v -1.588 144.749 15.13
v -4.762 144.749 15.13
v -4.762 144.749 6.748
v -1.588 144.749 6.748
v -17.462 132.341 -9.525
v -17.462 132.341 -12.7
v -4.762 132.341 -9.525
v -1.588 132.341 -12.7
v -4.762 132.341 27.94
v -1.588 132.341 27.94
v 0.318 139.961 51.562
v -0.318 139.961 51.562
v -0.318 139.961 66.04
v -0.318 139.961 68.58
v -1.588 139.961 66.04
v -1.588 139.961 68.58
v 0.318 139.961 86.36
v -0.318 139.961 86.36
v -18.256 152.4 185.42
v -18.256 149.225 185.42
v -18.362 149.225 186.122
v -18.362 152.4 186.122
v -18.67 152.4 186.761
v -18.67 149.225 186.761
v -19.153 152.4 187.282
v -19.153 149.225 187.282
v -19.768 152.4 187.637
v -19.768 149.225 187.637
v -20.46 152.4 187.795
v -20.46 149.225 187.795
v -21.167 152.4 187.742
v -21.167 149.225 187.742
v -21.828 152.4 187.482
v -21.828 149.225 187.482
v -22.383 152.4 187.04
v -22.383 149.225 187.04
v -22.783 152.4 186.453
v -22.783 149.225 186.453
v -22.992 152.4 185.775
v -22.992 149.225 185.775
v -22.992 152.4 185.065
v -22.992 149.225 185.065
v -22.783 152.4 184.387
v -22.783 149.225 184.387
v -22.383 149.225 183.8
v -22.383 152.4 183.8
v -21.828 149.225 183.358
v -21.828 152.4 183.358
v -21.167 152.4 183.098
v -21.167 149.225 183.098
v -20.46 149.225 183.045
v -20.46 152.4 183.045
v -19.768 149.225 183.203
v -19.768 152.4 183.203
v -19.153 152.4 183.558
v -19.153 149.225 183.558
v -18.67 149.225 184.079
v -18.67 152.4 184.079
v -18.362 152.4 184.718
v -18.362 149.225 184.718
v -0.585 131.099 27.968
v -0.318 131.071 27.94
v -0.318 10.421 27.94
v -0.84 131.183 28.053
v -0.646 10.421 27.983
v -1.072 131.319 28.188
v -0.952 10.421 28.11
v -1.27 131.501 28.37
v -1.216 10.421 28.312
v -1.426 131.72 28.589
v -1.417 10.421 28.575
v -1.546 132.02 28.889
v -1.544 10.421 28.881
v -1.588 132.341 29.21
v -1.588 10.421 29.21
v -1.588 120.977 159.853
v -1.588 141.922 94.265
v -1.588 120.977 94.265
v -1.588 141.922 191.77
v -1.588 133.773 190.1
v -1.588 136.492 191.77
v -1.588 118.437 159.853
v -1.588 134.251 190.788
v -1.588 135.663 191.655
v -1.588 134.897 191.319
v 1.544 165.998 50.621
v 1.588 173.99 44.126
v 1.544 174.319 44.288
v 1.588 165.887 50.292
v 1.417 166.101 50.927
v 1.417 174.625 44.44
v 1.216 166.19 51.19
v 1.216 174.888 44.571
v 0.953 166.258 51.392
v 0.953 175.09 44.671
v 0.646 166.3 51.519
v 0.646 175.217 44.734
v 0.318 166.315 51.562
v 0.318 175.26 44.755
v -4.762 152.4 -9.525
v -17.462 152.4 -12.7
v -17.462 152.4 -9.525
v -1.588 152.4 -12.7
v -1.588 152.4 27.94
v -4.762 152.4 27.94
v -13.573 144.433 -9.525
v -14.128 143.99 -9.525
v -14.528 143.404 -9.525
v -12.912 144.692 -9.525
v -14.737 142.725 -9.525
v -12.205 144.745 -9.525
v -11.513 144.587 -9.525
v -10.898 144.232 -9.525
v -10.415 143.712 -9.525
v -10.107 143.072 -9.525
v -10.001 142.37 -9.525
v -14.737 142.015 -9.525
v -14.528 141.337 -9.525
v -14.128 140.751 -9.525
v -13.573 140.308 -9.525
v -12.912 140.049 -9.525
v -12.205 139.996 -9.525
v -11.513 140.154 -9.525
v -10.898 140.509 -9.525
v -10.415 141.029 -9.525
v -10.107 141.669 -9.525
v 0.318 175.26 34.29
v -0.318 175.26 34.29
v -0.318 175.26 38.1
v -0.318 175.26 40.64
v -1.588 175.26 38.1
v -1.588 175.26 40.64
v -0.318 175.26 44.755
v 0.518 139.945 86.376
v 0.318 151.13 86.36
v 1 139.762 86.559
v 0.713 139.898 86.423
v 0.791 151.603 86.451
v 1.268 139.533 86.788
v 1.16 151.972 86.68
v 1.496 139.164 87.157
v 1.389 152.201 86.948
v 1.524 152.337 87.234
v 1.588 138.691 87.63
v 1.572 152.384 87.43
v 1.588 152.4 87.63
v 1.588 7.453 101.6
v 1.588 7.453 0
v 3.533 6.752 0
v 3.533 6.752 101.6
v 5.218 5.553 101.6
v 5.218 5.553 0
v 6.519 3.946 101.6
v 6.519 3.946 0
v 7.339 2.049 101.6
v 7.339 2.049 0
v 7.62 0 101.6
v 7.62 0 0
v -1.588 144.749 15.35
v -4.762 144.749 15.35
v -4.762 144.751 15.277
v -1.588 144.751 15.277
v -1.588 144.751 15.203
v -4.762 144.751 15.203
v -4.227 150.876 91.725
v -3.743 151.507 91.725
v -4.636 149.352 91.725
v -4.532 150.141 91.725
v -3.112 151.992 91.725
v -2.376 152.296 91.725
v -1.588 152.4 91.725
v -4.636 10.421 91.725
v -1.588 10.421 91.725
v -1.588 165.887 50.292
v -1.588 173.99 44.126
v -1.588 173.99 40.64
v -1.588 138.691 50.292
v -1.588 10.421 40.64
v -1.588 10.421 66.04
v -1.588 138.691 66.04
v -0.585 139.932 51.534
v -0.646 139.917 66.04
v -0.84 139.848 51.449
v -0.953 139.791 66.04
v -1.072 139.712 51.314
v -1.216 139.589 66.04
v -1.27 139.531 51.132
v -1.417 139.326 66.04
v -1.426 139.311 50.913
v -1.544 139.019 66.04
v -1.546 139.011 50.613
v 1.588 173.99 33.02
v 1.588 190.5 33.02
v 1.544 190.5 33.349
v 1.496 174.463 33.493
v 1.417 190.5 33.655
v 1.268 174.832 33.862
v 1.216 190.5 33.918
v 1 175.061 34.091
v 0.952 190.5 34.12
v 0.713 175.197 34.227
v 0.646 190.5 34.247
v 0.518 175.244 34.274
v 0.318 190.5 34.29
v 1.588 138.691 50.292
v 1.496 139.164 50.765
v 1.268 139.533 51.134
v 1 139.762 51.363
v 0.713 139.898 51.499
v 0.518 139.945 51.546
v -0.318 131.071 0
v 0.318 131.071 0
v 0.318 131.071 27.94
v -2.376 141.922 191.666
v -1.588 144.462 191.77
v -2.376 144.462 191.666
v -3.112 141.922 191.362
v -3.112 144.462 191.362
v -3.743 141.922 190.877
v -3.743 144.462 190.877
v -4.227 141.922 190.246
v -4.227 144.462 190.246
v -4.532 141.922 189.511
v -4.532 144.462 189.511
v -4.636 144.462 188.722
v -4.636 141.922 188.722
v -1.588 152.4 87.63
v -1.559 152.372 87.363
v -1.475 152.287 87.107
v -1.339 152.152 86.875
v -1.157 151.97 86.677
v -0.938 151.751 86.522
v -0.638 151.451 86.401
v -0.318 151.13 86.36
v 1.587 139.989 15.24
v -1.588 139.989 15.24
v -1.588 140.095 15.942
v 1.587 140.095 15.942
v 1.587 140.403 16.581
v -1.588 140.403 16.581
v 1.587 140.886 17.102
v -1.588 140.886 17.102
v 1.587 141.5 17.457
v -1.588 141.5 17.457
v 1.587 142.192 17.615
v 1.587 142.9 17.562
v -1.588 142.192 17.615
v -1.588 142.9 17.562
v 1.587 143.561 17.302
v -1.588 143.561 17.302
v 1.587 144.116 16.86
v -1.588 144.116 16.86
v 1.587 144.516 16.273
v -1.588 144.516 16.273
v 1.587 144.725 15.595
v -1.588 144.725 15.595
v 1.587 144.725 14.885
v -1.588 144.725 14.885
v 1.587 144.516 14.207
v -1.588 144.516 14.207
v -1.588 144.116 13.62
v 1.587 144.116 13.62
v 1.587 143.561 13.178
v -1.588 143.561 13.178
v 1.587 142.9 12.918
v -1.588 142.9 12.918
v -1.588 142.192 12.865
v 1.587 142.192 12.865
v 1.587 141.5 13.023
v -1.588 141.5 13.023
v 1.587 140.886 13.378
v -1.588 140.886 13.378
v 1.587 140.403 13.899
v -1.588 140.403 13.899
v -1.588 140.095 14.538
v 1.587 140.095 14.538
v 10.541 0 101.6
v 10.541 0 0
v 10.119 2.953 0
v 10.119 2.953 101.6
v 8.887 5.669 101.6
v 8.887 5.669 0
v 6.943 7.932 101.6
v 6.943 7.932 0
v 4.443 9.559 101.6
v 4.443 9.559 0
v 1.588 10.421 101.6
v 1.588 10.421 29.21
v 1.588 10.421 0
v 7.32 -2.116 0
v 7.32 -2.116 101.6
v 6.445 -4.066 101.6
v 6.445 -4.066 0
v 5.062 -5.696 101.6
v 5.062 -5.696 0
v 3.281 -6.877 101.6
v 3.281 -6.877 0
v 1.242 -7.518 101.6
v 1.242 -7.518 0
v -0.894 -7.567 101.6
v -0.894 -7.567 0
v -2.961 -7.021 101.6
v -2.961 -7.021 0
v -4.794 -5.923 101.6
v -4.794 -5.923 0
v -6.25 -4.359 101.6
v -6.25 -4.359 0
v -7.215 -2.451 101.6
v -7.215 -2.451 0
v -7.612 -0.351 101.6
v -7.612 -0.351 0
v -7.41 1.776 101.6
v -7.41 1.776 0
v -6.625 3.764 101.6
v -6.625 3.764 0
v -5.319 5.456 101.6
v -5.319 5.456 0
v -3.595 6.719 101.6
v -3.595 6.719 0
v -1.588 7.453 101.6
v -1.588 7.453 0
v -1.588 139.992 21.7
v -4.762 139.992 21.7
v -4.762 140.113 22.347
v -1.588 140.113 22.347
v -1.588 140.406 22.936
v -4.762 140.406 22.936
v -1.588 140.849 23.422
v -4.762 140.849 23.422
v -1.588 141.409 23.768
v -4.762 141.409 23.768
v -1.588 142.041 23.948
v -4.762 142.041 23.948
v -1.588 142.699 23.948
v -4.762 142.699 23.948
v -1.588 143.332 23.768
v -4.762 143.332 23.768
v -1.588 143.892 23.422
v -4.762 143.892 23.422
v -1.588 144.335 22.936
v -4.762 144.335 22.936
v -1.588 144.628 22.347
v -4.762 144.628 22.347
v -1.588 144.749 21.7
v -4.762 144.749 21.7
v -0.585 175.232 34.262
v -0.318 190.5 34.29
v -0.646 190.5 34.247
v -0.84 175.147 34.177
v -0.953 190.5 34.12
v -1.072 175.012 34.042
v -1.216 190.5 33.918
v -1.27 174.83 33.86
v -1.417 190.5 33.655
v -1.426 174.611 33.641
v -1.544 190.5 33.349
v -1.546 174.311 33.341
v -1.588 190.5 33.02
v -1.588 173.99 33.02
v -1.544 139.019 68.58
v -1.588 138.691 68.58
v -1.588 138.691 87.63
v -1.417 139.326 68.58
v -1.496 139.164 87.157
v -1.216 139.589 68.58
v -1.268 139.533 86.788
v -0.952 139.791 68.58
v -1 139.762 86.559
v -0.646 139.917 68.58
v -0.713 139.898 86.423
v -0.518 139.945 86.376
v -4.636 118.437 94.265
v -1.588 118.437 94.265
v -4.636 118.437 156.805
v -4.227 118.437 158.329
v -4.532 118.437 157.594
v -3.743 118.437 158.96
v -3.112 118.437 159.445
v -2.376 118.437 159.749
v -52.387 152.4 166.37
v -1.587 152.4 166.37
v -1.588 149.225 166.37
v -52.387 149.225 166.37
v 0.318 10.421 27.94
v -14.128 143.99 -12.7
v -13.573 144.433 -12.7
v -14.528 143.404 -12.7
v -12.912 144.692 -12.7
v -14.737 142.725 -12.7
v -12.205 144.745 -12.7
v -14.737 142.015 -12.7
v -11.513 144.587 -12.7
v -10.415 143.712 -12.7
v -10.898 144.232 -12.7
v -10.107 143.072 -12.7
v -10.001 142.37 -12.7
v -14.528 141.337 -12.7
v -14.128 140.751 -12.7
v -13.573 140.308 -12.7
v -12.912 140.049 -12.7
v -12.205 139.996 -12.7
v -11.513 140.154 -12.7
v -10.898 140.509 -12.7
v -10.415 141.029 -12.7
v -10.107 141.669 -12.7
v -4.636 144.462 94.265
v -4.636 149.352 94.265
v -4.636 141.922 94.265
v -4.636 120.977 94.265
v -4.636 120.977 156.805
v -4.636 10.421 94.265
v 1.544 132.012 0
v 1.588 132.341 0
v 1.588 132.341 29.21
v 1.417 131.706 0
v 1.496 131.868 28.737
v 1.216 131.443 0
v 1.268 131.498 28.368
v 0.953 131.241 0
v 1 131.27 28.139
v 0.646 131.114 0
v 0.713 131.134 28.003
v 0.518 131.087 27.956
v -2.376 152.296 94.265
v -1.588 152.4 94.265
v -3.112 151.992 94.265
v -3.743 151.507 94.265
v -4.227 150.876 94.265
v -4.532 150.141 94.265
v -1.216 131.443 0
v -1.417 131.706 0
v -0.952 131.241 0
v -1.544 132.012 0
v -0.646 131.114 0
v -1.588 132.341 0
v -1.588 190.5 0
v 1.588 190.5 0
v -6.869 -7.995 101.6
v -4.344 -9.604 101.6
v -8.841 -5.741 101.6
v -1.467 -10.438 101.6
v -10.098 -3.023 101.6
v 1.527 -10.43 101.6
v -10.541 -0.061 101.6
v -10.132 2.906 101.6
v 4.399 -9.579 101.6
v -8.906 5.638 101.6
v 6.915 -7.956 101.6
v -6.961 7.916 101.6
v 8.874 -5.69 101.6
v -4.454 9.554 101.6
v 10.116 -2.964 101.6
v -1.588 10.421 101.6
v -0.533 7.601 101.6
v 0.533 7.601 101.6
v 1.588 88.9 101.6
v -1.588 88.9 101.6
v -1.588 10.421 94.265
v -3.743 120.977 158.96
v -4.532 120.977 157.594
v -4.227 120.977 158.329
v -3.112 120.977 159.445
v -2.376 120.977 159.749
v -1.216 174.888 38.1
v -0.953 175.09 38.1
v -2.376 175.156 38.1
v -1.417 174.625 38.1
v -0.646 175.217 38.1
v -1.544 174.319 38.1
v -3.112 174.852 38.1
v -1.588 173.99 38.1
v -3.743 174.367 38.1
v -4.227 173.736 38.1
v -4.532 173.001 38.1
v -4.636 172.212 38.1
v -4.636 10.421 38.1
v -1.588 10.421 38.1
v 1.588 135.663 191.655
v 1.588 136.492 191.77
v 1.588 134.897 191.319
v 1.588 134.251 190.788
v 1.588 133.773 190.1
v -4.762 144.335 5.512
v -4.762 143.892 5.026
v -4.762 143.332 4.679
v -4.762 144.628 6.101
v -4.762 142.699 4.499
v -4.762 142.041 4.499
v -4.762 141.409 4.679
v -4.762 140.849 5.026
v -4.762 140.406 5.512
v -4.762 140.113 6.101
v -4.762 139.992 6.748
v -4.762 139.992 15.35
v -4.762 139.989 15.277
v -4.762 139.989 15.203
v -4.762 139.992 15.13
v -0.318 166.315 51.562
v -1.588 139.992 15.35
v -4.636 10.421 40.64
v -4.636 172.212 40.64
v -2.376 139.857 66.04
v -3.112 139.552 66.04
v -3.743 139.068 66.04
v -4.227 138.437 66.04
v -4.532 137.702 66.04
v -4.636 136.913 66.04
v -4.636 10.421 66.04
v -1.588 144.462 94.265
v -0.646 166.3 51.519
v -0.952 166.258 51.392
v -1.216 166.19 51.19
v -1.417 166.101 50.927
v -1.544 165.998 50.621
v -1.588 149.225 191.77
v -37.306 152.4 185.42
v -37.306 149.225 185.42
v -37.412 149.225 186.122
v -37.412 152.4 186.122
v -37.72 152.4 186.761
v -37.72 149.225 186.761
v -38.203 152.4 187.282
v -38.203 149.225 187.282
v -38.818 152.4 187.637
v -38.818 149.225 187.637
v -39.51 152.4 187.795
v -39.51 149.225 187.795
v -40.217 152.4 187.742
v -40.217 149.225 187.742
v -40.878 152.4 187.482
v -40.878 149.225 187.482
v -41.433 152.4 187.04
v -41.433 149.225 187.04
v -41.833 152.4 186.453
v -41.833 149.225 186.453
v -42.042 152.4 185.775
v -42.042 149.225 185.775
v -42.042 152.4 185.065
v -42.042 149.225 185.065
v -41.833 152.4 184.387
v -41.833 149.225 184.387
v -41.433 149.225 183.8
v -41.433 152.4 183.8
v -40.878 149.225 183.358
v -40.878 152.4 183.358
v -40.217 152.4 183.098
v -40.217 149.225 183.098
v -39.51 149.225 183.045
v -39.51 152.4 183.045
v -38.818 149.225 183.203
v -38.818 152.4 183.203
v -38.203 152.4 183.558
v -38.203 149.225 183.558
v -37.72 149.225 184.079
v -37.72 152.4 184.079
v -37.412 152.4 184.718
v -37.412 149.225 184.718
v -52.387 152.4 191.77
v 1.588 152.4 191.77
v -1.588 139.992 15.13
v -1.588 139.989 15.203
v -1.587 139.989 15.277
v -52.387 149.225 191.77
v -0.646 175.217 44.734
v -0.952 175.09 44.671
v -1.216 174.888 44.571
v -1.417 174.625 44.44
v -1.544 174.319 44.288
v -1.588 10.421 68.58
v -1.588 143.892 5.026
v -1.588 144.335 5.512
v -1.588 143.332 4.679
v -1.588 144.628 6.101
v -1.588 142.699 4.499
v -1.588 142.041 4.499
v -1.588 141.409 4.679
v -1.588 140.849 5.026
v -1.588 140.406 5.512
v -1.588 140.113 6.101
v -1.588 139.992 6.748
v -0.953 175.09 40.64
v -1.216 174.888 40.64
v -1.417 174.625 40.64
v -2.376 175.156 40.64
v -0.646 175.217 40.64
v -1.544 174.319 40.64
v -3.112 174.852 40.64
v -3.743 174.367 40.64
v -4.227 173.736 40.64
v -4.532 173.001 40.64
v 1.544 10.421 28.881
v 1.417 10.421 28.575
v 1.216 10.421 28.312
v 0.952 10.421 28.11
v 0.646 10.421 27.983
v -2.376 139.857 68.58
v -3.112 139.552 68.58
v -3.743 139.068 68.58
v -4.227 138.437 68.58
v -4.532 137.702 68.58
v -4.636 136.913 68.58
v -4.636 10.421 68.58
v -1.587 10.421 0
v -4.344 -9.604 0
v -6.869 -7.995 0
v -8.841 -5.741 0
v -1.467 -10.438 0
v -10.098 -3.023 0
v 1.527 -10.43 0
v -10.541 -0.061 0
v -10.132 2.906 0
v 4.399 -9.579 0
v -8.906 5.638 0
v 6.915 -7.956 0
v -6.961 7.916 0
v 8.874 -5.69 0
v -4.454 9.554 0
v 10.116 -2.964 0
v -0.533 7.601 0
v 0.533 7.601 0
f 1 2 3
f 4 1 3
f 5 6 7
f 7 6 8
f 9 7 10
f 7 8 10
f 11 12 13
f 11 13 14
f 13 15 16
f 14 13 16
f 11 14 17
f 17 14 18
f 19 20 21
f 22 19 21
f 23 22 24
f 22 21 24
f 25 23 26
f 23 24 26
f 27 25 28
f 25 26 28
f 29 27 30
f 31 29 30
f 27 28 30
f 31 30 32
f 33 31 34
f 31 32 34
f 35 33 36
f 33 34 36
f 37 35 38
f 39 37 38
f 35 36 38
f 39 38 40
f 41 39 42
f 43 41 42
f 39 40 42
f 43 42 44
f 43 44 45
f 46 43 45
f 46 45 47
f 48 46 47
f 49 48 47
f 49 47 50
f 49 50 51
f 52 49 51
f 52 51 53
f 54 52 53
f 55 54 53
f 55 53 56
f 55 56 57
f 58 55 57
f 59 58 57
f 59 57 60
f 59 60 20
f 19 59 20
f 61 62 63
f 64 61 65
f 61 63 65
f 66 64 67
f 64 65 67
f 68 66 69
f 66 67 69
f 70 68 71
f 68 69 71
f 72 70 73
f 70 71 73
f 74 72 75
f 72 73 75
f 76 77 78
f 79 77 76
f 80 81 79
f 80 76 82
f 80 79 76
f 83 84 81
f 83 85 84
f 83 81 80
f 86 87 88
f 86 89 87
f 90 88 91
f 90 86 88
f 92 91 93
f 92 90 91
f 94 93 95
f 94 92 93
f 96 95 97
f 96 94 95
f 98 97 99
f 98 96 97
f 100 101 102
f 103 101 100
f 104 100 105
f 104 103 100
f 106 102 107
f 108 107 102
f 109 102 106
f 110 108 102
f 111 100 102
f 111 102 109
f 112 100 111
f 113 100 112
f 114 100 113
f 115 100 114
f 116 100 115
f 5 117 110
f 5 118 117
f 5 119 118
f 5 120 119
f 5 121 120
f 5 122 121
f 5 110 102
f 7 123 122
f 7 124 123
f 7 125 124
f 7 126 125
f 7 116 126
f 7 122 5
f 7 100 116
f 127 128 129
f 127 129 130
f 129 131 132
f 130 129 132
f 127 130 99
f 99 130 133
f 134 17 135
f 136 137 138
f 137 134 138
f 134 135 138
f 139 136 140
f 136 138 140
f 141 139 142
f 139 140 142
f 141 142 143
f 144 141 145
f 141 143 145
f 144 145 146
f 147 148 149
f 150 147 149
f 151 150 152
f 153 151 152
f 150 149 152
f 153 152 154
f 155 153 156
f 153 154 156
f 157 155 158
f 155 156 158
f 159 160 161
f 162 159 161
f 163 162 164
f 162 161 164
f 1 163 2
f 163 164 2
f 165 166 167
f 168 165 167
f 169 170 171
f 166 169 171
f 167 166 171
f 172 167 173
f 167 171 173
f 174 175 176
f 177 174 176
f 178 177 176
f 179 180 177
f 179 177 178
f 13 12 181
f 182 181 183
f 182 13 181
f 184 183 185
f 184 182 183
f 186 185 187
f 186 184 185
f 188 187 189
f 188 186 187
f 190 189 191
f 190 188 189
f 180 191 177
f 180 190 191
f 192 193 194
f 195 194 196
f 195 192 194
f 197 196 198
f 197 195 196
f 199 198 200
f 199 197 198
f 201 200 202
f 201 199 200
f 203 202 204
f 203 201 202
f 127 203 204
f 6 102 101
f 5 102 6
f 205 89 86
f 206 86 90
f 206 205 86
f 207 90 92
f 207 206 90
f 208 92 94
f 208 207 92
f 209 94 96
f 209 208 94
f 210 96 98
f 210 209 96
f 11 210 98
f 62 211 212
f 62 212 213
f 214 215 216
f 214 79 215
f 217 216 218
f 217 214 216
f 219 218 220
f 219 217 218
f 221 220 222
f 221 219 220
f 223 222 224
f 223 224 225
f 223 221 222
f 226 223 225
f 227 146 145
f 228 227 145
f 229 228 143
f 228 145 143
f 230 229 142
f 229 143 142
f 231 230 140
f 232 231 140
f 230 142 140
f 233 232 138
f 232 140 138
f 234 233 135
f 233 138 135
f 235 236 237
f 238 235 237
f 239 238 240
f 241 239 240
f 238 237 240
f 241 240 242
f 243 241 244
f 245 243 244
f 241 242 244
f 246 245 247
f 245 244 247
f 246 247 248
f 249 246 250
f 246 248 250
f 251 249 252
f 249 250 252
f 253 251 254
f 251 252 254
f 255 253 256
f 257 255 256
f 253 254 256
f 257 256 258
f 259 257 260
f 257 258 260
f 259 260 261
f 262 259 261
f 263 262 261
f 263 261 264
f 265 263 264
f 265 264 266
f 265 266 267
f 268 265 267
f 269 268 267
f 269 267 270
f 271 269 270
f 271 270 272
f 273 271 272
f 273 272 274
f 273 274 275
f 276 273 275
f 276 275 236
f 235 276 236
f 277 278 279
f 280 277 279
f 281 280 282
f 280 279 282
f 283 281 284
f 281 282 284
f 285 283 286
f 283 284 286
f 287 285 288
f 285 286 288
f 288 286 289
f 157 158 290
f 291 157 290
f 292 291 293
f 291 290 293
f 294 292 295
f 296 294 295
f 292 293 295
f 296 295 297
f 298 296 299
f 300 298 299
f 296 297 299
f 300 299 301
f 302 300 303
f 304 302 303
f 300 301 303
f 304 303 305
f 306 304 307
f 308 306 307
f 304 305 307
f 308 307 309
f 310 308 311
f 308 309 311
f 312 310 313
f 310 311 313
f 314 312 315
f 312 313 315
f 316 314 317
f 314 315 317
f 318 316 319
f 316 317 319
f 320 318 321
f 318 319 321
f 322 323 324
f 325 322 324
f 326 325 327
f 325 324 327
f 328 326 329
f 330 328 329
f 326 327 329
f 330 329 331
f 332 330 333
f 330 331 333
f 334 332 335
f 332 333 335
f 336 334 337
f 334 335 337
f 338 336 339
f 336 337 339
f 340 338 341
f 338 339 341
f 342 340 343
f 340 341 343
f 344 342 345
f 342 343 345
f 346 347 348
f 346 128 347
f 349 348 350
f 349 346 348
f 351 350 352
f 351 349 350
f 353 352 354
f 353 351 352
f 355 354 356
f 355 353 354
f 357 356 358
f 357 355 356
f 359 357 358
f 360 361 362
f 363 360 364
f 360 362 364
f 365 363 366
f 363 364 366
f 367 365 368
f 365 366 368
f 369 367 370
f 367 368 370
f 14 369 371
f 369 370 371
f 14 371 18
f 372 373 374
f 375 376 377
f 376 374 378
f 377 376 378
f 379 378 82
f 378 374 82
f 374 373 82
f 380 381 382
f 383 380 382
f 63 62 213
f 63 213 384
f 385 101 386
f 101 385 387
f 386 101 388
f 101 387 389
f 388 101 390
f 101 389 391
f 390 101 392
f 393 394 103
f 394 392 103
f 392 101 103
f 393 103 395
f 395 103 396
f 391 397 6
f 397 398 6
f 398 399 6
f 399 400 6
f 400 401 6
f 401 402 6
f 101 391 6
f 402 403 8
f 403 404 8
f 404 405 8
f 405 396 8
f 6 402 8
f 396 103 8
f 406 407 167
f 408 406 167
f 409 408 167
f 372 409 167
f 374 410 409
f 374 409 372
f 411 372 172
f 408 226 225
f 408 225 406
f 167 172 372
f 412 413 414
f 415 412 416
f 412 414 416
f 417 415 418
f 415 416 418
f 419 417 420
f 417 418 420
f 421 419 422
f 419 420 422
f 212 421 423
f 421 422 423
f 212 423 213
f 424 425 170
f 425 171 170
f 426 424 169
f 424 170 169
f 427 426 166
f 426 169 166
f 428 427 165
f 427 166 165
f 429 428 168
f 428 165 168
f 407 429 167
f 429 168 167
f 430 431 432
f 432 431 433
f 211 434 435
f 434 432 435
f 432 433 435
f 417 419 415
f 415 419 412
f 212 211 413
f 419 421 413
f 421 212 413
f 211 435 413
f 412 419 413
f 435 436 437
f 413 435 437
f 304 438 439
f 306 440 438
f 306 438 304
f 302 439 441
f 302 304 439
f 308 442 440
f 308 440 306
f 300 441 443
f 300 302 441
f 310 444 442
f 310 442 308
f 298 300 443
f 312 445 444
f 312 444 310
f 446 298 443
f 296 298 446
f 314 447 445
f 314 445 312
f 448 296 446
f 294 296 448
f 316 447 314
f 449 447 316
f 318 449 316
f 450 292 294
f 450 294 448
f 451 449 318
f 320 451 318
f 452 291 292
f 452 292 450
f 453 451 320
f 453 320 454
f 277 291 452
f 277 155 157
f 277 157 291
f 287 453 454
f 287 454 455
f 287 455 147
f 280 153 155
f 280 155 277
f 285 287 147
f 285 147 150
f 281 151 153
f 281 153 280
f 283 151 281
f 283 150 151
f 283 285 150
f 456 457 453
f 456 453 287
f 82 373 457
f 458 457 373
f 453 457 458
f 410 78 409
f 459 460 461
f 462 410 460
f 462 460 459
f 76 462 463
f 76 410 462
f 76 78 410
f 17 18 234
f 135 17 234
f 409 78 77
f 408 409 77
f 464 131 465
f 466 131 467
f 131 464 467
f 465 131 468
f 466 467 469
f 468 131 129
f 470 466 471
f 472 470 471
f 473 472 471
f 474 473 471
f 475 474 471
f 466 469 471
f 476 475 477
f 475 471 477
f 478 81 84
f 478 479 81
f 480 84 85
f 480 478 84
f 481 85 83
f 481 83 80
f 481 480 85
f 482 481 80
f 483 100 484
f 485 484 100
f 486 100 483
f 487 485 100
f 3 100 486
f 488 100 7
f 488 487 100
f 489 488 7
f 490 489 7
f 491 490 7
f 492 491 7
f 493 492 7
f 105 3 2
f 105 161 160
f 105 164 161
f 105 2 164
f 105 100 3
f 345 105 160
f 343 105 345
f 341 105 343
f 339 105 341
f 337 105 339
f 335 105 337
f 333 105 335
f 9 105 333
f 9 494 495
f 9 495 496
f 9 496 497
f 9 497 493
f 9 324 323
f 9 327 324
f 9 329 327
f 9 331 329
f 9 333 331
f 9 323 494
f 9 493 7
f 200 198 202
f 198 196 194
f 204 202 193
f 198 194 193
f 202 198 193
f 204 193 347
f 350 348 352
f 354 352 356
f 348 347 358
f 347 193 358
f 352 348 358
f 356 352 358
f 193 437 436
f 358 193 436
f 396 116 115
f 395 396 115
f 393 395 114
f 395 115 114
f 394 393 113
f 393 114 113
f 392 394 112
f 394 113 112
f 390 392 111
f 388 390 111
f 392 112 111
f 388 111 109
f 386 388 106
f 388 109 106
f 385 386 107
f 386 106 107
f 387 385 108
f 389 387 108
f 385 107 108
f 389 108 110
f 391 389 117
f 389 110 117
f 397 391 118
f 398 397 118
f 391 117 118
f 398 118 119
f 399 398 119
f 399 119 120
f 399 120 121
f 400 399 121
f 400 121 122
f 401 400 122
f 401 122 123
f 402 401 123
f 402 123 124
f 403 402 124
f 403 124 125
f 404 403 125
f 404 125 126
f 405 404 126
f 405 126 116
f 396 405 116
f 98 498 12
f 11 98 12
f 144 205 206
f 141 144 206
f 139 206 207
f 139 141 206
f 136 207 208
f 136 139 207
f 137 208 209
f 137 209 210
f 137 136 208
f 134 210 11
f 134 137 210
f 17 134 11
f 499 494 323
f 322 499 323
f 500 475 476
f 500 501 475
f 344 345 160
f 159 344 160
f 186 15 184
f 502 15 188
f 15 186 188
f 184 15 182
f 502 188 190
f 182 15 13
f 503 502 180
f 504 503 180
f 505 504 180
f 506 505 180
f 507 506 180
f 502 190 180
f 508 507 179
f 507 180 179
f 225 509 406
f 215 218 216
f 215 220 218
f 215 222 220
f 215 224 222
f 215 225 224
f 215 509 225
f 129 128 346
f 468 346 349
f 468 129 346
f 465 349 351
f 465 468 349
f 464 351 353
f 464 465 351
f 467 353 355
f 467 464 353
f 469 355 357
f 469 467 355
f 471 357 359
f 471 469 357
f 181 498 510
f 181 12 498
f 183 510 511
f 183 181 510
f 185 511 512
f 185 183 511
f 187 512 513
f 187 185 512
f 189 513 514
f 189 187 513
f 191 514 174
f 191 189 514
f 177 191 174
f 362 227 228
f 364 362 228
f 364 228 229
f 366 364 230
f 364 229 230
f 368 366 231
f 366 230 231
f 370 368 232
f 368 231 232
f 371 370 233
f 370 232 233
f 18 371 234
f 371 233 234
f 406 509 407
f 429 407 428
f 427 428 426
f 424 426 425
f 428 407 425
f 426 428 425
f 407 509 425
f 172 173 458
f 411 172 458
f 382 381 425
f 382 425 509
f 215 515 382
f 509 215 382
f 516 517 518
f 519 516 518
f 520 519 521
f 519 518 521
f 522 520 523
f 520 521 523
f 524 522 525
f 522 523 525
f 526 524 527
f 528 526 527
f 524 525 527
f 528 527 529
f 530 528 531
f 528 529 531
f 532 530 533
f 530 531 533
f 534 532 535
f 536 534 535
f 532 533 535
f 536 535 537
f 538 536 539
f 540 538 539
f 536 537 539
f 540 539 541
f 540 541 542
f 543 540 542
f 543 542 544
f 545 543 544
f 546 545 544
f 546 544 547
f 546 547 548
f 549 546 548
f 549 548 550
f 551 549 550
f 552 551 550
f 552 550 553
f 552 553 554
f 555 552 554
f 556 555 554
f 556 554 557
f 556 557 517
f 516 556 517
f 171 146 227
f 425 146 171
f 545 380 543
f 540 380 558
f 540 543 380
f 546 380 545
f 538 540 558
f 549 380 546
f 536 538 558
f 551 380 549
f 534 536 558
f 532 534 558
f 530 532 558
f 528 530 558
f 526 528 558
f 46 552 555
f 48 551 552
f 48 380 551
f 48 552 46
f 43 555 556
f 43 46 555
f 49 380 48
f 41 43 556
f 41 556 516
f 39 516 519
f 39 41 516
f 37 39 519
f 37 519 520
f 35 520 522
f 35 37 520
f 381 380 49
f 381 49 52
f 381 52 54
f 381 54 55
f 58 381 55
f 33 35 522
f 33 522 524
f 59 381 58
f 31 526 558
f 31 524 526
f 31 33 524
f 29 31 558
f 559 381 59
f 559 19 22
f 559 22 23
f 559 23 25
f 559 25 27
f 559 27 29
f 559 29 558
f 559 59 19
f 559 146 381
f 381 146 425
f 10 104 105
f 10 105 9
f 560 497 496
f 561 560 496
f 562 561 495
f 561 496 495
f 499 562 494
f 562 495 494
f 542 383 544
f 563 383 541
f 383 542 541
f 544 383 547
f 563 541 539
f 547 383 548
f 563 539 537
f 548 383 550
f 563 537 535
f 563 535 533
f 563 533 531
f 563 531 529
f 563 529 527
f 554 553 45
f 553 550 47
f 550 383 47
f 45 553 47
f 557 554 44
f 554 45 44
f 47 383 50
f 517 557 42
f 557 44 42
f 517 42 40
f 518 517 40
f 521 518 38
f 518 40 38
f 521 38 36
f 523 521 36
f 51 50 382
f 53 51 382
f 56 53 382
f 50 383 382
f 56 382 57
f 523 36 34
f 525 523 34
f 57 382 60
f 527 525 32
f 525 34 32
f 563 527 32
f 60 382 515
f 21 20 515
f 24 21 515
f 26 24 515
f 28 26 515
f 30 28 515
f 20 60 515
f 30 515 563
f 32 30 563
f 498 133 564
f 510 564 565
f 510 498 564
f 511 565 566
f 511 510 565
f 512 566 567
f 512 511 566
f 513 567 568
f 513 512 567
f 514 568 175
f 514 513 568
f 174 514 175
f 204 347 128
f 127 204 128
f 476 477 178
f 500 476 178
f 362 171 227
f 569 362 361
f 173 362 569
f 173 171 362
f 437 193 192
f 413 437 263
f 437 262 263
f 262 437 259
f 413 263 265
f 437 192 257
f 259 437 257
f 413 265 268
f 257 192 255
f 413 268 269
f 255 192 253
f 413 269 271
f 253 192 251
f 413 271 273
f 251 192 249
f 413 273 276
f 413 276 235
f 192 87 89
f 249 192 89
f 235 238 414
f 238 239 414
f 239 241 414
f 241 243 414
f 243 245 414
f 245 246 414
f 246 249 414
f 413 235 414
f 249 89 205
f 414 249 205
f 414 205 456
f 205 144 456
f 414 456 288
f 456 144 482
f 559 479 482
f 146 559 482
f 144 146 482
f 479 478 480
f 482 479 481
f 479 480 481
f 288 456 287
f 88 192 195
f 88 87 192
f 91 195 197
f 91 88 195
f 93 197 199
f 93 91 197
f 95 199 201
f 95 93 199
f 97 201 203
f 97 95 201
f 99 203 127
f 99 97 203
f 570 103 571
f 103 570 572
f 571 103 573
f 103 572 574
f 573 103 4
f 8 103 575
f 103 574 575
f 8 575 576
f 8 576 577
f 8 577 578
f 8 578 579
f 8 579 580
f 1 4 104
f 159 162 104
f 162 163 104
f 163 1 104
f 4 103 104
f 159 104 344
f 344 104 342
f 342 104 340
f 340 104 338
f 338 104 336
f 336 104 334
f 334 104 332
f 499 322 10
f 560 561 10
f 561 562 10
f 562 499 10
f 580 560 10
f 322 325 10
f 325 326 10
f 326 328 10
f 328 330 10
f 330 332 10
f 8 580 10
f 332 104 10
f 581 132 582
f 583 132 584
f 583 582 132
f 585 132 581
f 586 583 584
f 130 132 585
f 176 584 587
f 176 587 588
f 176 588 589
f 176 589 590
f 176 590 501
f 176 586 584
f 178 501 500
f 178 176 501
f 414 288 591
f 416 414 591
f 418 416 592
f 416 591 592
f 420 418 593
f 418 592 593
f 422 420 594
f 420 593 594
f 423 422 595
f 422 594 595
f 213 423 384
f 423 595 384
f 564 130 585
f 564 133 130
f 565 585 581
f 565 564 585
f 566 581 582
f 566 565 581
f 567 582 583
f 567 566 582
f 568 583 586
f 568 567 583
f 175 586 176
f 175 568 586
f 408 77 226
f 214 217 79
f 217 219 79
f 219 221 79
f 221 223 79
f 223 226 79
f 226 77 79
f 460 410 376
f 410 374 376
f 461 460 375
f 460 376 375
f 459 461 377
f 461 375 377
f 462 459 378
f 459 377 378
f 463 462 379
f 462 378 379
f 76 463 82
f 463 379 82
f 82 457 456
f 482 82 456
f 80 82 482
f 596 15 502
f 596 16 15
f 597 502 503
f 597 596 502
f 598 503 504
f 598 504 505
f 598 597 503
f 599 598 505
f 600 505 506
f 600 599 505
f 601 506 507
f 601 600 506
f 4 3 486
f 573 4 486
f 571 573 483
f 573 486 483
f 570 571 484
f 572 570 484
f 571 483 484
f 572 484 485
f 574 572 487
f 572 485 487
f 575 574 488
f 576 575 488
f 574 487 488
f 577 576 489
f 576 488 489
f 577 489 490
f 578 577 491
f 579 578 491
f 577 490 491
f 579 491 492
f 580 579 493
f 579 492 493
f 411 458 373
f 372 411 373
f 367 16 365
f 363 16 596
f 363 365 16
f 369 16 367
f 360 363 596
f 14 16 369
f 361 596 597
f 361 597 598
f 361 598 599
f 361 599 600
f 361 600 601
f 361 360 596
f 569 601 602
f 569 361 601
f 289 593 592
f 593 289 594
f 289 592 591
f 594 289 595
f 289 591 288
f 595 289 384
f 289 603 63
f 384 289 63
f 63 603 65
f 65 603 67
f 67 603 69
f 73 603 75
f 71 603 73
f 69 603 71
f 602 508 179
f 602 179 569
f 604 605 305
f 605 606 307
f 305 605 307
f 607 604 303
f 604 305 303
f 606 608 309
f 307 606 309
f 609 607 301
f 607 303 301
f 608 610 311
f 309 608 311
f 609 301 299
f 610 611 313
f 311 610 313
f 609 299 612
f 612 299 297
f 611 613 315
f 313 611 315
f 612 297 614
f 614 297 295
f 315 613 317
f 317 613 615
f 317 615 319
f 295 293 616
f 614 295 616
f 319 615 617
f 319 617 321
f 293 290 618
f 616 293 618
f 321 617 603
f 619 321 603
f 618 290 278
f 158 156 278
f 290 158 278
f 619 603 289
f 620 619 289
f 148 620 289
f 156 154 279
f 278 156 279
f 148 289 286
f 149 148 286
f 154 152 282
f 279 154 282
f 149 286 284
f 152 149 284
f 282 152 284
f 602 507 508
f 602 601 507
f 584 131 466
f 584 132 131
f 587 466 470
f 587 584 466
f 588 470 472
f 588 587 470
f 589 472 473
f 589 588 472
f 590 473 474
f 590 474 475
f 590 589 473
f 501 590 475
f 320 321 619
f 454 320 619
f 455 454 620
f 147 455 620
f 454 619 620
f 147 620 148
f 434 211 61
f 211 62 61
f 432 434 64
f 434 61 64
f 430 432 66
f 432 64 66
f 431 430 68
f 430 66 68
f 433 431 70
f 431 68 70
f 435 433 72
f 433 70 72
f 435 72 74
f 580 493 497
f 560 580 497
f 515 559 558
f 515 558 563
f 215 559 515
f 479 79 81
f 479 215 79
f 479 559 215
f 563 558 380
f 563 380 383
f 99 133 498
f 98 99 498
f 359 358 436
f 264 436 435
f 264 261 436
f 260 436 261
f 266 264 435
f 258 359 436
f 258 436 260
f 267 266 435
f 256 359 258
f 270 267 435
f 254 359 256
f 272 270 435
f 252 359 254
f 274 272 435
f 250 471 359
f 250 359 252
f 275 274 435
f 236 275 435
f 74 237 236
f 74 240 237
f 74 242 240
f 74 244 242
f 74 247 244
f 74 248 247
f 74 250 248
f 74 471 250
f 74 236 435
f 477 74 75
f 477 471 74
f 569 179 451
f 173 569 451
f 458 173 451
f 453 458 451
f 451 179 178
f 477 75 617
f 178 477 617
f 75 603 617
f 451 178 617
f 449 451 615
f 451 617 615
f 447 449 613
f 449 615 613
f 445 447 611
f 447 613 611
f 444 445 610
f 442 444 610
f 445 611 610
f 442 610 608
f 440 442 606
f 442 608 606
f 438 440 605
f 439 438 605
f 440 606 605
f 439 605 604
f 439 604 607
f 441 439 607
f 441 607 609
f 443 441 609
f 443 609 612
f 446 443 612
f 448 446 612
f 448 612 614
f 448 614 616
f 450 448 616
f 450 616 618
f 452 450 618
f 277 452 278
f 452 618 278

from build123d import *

# Parameters (mm, degrees)
F1_DEPTH  = 101.6
F2_W      = 120.65
F2_H      = 27.94
F3_DEPTH  = 3.175
F4_W      = 38.1
F4_H      = 15.24
F5_DEPTH  = 3.175
F7_DEPTH  = 3.175
F8_W      = 3.175
F8_H      = 25.4
F9_DEPTH  = 50.8
F10_R     = 2.38125
F11_DEPTH = 7.62
F12_W     = 2.54
F12_H     = 65.5879406387
F12_H_2   = 97.5048740911
F12_W_2   = 129.54
F12_H_3   = 2.54
F12_W_3   = 164.8392262883
F13_DEPTH = 3.048
F14_R     = 3.04799
F15_R     = 1.27
F16_W     = 20.0592262883
F16_H     = 27.94
F16_H_2   = 12.7
F17_DEPTH = 3.175
F18_R     = 2.38125
F19_DEPTH = 25.4
F21_DEPTH = 3.175
F22_W     = 20.0592262883
F22_H     = 3.175
F23_DEPTH = 12.7
F24_R     = 2.38125
F25_DEPTH = 25.4


# Not quite as in the source:
# - a fillet or chamfer is up to 0.001 mm smaller than in the source, because OpenCascade refuses the exact size


with BuildPart() as f1:
    # F0 (on Top) → F1 (new body)
    with BuildSketch(Plane.XY):
        with BuildLine():
            ThreePointArc((1.5875, 7.4528010674), (5.9228856987, 4.7941448664), (7.62, 0))
            ThreePointArc((7.62, 0), (-4.7941448664, -5.9228856987), (-1.5875, 7.4528010674))
            Line((-1.5875, 7.4528010674), (-1.5875, 10.4207737117))
            ThreePointArc((-1.5875, 10.4207737117), (-6.8694557099, -7.9952022645), (10.541, 0))
            ThreePointArc((10.541, 0), (7.9952022645, 6.8694557099), (1.5875, 10.4207737117))
            Line((1.5875, 10.4207737117), (1.5875, 7.4528010674))
        make_face()
        with BuildLine():
            ThreePointArc((-1.5875, 7.4528010674), (0, 7.62), (1.5875, 7.4528010674))
            Line((1.5875, 7.4528010674), (1.5875, 10.4207737117))
            ThreePointArc((1.5875, 10.4207737117), (0, 10.541), (-1.5875, 10.4207737117))
            Line((-1.5875, 10.4207737117), (-1.5875, 7.4528010674))
        make_face()
        with BuildLine():
            ThreePointArc((-1.5875, 10.4207737117), (0, 10.541), (1.5875, 10.4207737117))
            Line((1.5875, 10.4207737117), (1.5875, 190.5))
            Line((1.5875, 190.5), (-1.5875, 190.5))
            Line((-1.5875, 190.5), (-1.5875, 10.4207737117))
        make_face()
    extrude(amount=F1_DEPTH)

    # F2 (on face) → F3 (cut, through all)
    with BuildSketch(Plane(origin=(-1.5875, 0, 0), x_dir=(0, -1, 0), z_dir=(-1, 0, 0))):
        with Locations((-70.7457737117, 13.97)):
            Rectangle(F2_W, F2_H)
    extrude(amount=-F3_DEPTH, mode=Mode.SUBTRACT)

    # F4 (on face) → F5 (cut, through all)
    with BuildSketch(Plane(origin=(-1.5875, 0, 0), x_dir=(0, -1, 0), z_dir=(-1, 0, 0))):
        Polygon((-152.4, 86.36), (-190.5, 86.36), (-190.5, 51.562), (-175.26, 51.562), (-166.3150191307, 51.562), (-139.9607737117, 51.562), (-139.9607737117, 86.36), align=None)
        with Locations((-171.45, 93.98)):
            Rectangle(F4_W, F4_H)
        Polygon((-175.26, 51.562), (-190.5, 51.562), (-190.5, 34.29), (-175.26, 34.29), (-175.26, 44.7550229728), align=None)
        Polygon((-166.3150191307, 51.562), (-175.26, 51.562), (-175.26, 44.7550229728), align=None)
    extrude(amount=-F5_DEPTH, mode=Mode.SUBTRACT)

    # F6 (on face) → F7 (join, through all)
    with BuildSketch(Plane(origin=(-1.5875, 0, 0), x_dir=(0, -1, 0), z_dir=(-1, 0, 0))):
        Polygon((-152.4, 191.77), (-152.4, 101.6), (-88.9, 101.6), (-134.62, 191.77), align=None)
    extrude(amount=-F7_DEPTH)

    # F8 (on face) → F9 (join)
    with BuildSketch(Plane(origin=(-1.5875, 0, 0), x_dir=(0, -1, 0), z_dir=(-1, 0, 0))):
        with Locations((-150.8125, 179.07)):
            Rectangle(F8_W, F8_H)
    extrude(amount=F9_DEPTH)

    # F10 (on face) + F9_face1 (on face) → F11 (cut)
    with BuildSketch(Plane.XZ.offset(-149.225)):
        with Locations((-39.6875, 185.42)):
            Circle(F10_R)
        with Locations((-20.6375, 185.42)):
            Circle(F10_R)
    with BuildSketch(Plane(origin=(-21.429280397, 152.4, 170.8307568238), x_dir=(-1, 0, 0), z_dir=(0, 1, 0))):
        Polygon((-23.016780397, -84.4707568238), (-19.841780397, -84.4707568238), (-19.841780397, -4.4607568238), (30.958219603, -4.4607568238), (30.958219603, 20.9392431762), (-23.016780397, 20.9392431762), align=None)
    extrude(amount=-F11_DEPTH, dir=(0, -1, 0), mode=Mode.SUBTRACT)

    # F12 (on face) → F13 (join)
    with BuildSketch(Plane(origin=(-1.5875, 0, 0), x_dir=(0, -1, 0), z_dir=(-1, 0, 0))):
        with Locations((-119.7067661368, 127.0590962282)):
            Rectangle(F12_W, F12_H)
        with Locations((-143.1925, 143.0175629544)):
            Rectangle(F12_W, F12_H_2)
        Polygon((-152.4, 91.7251259089), (-10.4207737117, 91.7251259089), (-10.4207737117, 94.2651259089), (-118.4367661368, 94.2651259089), (-120.9767661368, 94.2651259089), (-141.9225, 94.2651259089), (-144.4625, 94.2651259089), (-152.4, 94.2651259089), align=None)
        with Locations((-75.1907737117, 67.31)):
            Rectangle(F12_W_2, F12_H_3)
        with Locations((-92.8403868558, 39.37)):
            Rectangle(F12_W_3, F12_H_3)
    extrude(amount=F13_DEPTH)

    # F14 (radius 3.048 in the source; OpenCascade refuses exactly that, so slightly less here)
    f14_edges = [f1.edges().sort_by_distance(p)[0] for p in [
        (0, 134.62, 191.77),
        (-4.6355, 143.1925, 191.77),
        (-4.6355, 152.4, 92.995126),
        (-4.6355, 139.960774, 67.31),
        (-4.6355, 119.706766, 159.853067),
        (-4.6355, 175.26, 39.37),
    ]]
    fillet(f14_edges, radius=F14_R)

    # F15
    f15_edges = [f1.edges().sort_by_distance(p)[0] for p in [
        (-1.5875, 170.78751, 48.158511),
        (-1.5875, 153.137896, 51.562),
        (-1.5875, 182.88, 34.29),
        (-1.5875, 175.26, 36.195),
        (-1.5875, 175.26, 42.697511),
        (1.5875, 182.88, 34.29),
        (1.5875, 175.26, 39.522511),
        (1.5875, 170.78751, 48.158511),
        (1.5875, 153.137896, 51.562),
        (-1.5875, 139.960774, 58.801),
        (-1.5875, 139.960774, 77.47),
        (1.5875, 139.960774, 68.961),
        (-1.5875, 146.180387, 86.36),
        (1.5875, 146.180387, 86.36),
        (0, 152.4, 86.36),
        (1.5875, 70.745774, 27.94),
        (-1.5875, 70.745774, 27.94),
        (1.5875, 131.070774, 13.97),
        (-1.5875, 131.070774, 13.97),
    ]]
    fillet(f15_edges, radius=F15_R)


with BuildPart() as f17:
    # F16 (on face) → F17 (new body)
    with BuildSketch(Plane(origin=(-1.5875, 0, 0), x_dir=(0, -1, 0), z_dir=(-1, 0, 0))):
        with Locations((-142.3703868558, 13.97)):
            Rectangle(F16_W, F16_H)
        with Locations((-142.3703868558, -6.35)):
            Rectangle(F16_W, F16_H_2)
    extrude(amount=F17_DEPTH)


with BuildPart() as f19_tool:
    # F18 (on face) → F19 (new body)
    with BuildSketch(Plane(origin=(-4.7625, 0, 0), x_dir=(0, -1, 0), z_dir=(-1, 0, 0))):
        with Locations((-142.3703868558, 15.24)):
            Circle(F18_R)
    extrude(amount=-F19_DEPTH)


with BuildPart() as f1_1:
    add(f1.part)

    # F19: cut by f19_tool
    add(f19_tool.part, mode=Mode.SUBTRACT)


with BuildPart() as f17_1:
    add(f17.part)

    # F19: cut by f19_tool
    add(f19_tool.part, mode=Mode.SUBTRACT)

    # F20 (on face) → F21 (cut, through all)
    with BuildSketch(Plane(origin=(-4.7625, 0, 0), x_dir=(0, -1, 0), z_dir=(-1, 0, 0))):
        with BuildLine():
            Line((-144.7490949204, 21.6999977557), (-139.9916787913, 21.6999977557))
            ThreePointArc((-139.9916787913, 21.6999977557), (-142.3703868558, 23.97125), (-144.7490949204, 21.6999977557))
        make_face()
        with BuildLine():
            Line((-139.9916787913, 21.4800022443), (-139.9916787913, 21.6999977557))
            Line((-139.9916787913, 21.6999977557), (-144.7490949204, 21.6999977557))
            Line((-144.7490949204, 21.6999977557), (-144.7490949204, 21.4800022443))
            ThreePointArc((-144.7490949204, 21.4800022443), (-142.3703868558, 19.20875), (-139.9916787913, 21.4800022443))
        make_face()
        with BuildLine():
            Line((-139.9916787913, 15.3499977557), (-139.9916787913, 21.4800022443))
            ThreePointArc((-139.9916787913, 21.4800022443), (-142.3703868558, 19.20875), (-144.7490949204, 21.4800022443))
            Line((-144.7490949204, 21.4800022443), (-144.7490949204, 15.3499977557))
            ThreePointArc((-144.7490949204, 15.3499977557), (-142.3703868558, 17.62125), (-139.9916787913, 15.3499977557))
        make_face()
        with BuildLine():
            Line((-139.9916787913, 6.9676285562), (-139.9916787913, 15.1300022443))
            ThreePointArc((-139.9916787913, 15.1300022443), (-142.3703868558, 12.85875), (-144.7490949204, 15.1300022443))
            Line((-144.7490949204, 15.1300022443), (-144.7490949204, 6.9676285562))
            ThreePointArc((-144.7490949204, 6.9676285562), (-142.3703868558, 9.2388808006), (-139.9916787913, 6.9676285562))
        make_face()
        with BuildLine():
            Line((-139.9916787913, 6.7476330449), (-139.9916787913, 6.9676285562))
            ThreePointArc((-139.9916787913, 6.9676285562), (-142.3703868558, 9.2388808006), (-144.7490949204, 6.9676285562))
            Line((-144.7490949204, 6.9676285562), (-144.7490949204, 6.7476330449))
            ThreePointArc((-144.7490949204, 6.7476330449), (-142.3703868558, 4.4763808006), (-139.9916787913, 6.7476330449))
        make_face()
    extrude(amount=-F21_DEPTH, mode=Mode.SUBTRACT)

    # F22 (on face) → F23 (join)
    with BuildSketch(Plane(origin=(-4.7625, 0, 0), x_dir=(0, -1, 0), z_dir=(-1, 0, 0))):
        with Locations((-142.3703868558, -11.1125)):
            Rectangle(F22_W, F22_H)
    extrude(amount=F23_DEPTH)

    # F24 (on face) → F25 (cut)
    with BuildSketch(Plane.XY.offset(-9.525)):
        with Locations((-12.3825, 142.3703868558)):
            Circle(F24_R)
    extrude(amount=-F25_DEPTH, mode=Mode.SUBTRACT)


solid = Compound([f1_1.part, f17_1.part])
